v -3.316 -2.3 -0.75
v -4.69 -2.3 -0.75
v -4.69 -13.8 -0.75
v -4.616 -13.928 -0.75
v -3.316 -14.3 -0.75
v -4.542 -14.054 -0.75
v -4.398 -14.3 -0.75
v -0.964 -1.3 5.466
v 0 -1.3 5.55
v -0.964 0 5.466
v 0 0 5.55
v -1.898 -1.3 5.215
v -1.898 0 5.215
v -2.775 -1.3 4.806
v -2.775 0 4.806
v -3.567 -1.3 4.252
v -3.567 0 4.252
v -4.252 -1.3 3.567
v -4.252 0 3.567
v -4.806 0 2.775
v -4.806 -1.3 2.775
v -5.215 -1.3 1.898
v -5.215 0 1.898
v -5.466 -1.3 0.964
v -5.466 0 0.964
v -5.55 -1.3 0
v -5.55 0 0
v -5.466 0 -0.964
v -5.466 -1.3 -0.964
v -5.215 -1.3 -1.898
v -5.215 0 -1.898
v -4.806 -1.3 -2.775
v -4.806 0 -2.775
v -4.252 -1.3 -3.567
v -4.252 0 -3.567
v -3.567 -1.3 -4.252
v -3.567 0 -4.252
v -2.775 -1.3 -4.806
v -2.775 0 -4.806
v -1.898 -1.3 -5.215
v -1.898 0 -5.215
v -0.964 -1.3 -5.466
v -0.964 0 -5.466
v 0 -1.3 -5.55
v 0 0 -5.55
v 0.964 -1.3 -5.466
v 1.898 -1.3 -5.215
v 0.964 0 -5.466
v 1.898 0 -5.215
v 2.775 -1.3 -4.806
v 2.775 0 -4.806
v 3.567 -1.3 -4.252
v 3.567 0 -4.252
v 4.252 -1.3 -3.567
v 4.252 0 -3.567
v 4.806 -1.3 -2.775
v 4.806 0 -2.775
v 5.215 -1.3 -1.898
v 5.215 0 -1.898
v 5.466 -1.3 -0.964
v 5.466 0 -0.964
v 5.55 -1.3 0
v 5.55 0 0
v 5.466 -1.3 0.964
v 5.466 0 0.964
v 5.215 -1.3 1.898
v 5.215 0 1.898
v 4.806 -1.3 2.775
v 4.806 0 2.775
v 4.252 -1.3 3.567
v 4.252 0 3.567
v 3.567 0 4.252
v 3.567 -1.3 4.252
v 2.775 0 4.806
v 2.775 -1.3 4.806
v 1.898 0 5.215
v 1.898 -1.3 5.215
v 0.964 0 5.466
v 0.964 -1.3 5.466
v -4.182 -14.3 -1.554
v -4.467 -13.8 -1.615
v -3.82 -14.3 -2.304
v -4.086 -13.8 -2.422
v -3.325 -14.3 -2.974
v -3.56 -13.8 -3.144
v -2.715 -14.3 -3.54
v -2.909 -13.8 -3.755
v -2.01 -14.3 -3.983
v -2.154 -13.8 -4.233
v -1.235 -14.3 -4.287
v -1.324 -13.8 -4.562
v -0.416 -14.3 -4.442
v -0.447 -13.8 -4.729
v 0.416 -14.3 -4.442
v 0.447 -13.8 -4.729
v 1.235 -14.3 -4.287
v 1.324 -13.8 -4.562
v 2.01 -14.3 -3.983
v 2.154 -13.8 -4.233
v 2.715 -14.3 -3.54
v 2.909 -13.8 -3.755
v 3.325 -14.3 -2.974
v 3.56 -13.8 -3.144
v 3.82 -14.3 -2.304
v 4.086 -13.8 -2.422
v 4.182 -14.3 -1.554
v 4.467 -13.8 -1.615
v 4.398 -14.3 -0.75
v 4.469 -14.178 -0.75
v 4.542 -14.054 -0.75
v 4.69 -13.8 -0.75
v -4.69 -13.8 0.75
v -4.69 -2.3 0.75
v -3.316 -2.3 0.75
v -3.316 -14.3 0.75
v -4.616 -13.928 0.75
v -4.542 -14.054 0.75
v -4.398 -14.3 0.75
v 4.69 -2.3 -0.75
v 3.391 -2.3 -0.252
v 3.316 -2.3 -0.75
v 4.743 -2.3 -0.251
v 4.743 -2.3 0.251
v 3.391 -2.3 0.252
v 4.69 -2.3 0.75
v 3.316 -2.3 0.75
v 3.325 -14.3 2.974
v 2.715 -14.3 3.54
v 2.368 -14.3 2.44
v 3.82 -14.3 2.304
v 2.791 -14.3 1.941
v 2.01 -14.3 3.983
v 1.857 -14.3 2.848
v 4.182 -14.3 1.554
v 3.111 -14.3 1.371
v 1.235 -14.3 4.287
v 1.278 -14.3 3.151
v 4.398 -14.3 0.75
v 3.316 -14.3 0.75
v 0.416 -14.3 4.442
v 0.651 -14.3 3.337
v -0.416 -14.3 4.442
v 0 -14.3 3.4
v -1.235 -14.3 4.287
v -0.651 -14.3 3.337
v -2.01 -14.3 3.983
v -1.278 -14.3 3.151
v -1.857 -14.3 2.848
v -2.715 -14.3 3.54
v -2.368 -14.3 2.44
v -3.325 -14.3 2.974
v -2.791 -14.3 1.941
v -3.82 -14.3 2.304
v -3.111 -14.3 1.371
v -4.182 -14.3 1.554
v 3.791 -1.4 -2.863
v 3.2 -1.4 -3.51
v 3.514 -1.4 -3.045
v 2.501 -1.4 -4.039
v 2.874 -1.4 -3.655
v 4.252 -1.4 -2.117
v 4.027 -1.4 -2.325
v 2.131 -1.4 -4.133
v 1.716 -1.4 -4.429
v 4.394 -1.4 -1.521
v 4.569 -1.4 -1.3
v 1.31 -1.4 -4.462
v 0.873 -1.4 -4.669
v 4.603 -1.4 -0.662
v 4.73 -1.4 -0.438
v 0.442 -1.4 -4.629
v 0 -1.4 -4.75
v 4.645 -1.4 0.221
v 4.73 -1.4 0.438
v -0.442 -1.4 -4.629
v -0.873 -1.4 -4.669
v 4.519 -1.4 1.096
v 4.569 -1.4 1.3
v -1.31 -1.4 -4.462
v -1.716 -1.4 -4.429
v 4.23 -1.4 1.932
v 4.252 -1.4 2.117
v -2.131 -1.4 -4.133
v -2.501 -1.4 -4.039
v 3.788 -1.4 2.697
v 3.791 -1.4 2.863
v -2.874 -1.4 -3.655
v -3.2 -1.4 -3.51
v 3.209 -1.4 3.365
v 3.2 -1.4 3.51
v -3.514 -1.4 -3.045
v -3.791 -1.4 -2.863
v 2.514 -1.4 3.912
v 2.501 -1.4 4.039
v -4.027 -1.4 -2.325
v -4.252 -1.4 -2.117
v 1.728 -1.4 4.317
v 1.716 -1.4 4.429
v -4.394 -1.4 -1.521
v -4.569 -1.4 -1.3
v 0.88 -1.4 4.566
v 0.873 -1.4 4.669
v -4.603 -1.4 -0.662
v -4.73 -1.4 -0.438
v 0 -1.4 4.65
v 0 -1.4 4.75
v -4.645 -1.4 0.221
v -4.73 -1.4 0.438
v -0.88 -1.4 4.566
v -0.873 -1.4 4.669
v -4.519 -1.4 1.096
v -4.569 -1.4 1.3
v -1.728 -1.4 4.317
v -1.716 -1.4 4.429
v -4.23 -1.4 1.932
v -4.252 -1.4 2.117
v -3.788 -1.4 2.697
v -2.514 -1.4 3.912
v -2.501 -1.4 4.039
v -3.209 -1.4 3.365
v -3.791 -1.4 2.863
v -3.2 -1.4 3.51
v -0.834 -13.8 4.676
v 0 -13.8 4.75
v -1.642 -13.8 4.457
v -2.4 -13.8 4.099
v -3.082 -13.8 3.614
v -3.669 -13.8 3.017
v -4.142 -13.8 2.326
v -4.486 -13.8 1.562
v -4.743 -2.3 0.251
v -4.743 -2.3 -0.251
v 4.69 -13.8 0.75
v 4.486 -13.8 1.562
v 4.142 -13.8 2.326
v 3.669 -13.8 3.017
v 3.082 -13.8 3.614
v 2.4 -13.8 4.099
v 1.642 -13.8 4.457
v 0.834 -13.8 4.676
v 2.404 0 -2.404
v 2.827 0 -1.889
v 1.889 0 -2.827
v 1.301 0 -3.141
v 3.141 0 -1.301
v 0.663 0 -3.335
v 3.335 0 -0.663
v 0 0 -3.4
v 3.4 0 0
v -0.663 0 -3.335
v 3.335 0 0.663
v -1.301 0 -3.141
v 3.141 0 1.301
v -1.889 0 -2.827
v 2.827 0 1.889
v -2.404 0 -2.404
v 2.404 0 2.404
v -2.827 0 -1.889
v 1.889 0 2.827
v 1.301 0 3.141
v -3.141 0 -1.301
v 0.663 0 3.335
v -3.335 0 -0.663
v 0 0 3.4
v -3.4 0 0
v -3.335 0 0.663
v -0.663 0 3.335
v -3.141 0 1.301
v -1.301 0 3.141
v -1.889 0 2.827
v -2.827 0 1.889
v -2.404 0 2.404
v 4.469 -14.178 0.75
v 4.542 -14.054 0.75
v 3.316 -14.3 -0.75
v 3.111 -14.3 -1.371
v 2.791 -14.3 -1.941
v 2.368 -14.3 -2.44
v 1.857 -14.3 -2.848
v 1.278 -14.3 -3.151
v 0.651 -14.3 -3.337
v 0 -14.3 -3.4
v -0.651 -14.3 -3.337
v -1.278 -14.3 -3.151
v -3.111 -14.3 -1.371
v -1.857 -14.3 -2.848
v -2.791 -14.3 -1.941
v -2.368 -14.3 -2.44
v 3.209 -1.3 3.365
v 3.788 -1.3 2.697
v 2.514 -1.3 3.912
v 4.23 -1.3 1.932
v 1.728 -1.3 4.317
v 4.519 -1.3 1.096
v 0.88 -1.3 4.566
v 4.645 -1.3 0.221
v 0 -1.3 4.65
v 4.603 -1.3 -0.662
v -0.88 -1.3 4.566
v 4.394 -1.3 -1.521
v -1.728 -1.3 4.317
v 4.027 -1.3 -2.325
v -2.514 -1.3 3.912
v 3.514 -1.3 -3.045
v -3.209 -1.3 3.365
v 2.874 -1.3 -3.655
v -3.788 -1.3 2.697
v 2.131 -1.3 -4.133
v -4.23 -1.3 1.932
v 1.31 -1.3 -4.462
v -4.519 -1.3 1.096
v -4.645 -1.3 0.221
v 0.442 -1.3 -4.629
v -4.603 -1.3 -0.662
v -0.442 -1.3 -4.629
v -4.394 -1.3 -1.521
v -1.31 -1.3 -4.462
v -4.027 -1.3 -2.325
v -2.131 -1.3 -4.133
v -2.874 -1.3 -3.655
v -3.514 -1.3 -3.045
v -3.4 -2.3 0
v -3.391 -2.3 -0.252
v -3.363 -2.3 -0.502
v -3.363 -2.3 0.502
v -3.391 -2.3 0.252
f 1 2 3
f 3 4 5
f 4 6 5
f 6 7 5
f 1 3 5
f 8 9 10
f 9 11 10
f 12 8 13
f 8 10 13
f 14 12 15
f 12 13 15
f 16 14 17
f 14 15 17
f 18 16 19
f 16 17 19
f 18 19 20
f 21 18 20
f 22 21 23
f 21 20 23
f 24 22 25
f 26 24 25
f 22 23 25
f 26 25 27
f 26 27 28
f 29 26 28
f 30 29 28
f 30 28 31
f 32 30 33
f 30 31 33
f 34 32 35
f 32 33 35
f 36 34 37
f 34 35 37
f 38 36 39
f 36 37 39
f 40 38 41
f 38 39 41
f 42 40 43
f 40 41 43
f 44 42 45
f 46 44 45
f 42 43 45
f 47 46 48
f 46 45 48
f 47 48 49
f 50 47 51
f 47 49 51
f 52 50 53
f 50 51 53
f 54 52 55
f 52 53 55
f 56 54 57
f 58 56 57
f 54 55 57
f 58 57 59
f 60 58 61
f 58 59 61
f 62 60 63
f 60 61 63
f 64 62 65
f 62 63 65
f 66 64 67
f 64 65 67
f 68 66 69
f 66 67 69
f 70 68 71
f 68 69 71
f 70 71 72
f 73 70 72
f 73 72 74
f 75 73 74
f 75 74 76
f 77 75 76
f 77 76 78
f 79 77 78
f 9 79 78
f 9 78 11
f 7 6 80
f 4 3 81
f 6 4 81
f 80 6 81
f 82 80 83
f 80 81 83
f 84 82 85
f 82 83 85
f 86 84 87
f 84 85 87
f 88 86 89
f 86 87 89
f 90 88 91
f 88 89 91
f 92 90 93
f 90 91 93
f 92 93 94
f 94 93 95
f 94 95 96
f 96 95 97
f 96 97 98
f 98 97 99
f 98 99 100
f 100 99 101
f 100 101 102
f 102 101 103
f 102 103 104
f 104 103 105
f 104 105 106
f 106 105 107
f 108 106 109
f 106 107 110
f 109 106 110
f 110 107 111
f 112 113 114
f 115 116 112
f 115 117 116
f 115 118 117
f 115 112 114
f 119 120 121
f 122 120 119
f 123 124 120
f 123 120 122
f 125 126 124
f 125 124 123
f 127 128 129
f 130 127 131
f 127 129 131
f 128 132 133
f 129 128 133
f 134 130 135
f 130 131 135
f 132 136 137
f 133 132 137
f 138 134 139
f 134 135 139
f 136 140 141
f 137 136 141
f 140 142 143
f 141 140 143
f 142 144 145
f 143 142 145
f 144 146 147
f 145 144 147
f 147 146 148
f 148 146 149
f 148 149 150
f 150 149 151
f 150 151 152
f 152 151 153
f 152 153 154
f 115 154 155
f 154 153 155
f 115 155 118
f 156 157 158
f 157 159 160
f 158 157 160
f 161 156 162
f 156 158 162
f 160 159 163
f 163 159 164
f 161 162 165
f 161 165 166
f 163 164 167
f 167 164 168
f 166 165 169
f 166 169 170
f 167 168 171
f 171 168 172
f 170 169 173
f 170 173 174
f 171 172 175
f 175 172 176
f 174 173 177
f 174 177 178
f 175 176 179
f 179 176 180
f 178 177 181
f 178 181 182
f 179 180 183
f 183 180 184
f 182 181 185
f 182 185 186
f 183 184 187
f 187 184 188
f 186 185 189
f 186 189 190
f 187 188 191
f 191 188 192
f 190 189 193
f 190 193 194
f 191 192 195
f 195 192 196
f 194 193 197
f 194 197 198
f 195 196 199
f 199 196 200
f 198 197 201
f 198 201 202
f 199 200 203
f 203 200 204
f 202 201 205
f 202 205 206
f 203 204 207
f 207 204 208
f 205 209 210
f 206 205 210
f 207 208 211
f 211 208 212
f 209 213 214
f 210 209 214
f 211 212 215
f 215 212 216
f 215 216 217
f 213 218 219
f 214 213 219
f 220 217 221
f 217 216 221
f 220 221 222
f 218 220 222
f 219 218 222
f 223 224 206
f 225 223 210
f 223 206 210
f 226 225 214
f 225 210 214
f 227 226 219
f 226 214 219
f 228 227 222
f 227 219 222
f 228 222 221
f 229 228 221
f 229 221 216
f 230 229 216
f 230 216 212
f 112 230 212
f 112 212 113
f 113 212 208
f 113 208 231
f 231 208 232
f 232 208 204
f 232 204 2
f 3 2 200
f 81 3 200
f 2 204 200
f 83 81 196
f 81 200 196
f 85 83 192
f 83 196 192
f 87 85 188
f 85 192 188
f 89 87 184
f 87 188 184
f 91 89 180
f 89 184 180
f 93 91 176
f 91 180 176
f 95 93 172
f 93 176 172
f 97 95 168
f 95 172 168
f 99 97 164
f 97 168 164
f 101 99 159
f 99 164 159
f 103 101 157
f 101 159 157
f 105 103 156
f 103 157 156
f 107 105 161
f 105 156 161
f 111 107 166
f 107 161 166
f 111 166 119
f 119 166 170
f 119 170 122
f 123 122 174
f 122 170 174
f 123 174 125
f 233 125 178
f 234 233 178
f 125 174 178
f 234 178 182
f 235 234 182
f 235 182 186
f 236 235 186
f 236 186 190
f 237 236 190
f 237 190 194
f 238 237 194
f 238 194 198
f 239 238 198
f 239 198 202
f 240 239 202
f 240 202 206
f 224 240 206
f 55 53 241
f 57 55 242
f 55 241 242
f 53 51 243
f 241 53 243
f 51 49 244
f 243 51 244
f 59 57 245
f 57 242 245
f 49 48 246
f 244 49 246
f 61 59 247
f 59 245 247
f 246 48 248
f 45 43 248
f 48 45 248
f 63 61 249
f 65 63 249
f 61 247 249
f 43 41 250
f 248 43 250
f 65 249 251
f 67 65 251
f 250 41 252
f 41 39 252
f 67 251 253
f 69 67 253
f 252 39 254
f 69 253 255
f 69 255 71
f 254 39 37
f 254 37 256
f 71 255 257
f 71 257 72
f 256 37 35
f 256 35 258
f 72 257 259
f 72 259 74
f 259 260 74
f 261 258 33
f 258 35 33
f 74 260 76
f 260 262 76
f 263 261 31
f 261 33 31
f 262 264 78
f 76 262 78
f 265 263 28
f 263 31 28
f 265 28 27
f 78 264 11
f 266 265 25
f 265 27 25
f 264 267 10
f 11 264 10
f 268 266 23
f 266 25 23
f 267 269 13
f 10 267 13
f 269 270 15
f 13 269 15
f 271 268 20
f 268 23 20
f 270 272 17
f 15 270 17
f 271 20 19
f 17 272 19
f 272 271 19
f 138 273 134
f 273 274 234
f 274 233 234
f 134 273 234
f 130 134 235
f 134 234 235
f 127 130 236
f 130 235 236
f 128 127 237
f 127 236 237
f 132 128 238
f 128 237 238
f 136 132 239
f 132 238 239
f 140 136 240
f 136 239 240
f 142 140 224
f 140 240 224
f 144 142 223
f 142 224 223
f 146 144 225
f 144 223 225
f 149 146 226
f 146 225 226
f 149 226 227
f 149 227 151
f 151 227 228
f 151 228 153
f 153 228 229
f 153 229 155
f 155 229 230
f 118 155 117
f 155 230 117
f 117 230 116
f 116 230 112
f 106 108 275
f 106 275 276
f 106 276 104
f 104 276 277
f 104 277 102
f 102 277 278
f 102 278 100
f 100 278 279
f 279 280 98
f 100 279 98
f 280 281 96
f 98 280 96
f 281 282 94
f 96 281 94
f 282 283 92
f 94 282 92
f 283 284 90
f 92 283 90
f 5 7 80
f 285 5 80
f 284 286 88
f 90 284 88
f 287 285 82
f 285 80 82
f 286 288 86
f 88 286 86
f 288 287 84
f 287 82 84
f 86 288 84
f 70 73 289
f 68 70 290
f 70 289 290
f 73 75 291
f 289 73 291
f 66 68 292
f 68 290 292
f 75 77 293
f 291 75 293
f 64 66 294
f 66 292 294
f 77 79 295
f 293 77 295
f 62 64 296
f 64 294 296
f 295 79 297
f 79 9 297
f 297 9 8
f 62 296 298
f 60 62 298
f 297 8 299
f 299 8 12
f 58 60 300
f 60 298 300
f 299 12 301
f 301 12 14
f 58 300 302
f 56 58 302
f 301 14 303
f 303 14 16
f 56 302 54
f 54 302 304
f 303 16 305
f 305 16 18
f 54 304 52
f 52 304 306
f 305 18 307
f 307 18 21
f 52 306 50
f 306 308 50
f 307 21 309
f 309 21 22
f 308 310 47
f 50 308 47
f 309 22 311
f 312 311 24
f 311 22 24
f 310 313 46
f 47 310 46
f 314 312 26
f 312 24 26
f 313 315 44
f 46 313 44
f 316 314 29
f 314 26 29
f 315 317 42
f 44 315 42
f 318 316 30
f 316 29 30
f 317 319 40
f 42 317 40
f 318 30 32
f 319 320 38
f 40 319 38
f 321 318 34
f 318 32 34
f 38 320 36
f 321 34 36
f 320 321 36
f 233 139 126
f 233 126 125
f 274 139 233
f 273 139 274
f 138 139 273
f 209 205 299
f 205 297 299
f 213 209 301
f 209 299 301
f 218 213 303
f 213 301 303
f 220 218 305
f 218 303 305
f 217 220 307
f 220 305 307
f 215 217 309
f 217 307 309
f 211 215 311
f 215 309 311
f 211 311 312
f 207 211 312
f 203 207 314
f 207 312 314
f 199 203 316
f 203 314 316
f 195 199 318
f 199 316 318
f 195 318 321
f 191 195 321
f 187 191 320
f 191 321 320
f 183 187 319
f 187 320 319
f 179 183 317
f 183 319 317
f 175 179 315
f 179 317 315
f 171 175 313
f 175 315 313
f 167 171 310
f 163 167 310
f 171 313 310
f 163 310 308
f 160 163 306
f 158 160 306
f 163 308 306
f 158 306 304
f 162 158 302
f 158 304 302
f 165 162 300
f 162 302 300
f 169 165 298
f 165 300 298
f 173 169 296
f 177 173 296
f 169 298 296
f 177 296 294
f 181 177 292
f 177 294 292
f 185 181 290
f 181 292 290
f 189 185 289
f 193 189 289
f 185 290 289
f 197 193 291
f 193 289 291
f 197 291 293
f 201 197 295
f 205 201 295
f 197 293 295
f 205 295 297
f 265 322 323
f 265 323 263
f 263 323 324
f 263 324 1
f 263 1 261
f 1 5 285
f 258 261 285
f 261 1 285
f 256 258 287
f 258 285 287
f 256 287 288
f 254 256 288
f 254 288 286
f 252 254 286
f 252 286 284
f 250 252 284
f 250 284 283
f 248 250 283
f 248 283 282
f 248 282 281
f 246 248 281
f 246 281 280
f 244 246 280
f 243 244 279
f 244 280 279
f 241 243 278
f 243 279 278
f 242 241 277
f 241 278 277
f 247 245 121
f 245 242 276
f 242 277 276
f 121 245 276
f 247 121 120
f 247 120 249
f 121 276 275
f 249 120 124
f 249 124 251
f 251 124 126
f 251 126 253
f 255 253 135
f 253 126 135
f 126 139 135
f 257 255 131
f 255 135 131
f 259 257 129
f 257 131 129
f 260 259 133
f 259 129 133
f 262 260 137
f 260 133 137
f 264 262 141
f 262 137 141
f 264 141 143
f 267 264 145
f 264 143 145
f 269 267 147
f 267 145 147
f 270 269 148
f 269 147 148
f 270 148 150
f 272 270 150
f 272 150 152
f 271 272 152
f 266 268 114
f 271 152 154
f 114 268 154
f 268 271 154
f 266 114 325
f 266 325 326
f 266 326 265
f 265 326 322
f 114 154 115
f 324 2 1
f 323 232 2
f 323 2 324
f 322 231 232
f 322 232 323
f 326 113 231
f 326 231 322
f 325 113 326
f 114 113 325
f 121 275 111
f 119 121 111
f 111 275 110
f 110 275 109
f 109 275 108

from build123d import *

# Parameters (mm, degrees)
TAPPED_HOLE1_D     = 6.8
SKETCH4_W          = 9.5
SKETCH4_H          = 1.5
CUT_EXTRUDE1_DEPTH = 12


with BuildPart() as part:
    # Sketch1 → Revolve1 (revolve)
    with BuildSketch(Plane(origin=(0, 0, 0), x_dir=(0, 0, -1), z_dir=(1, 0, 0))):
        Polygon((-4.75, -13.8), (-4.75, -1.4), (-4.65, -1.4), (-4.65, -1.3), (-5.55, -1.3), (-5.55, 0), (-3.25, 0), (-3.25, -14.3), (-4.461324865, -14.3), align=None)
    revolve(axis=Axis((0, 0, 0), (0, -1, 0)))

    # Tapped Hole1 (through all)
    with Locations(Plane(origin=(0, 0, 0), x_dir=(1, 0, 0), z_dir=(0, 1, 0))):
        with Locations((0, 0)):
            Hole(TAPPED_HOLE1_D / 2)

    # Sketch4 → Cut-Extrude1 (cut)
    with BuildSketch(Plane.XZ.offset(14.3)):
        Rectangle(SKETCH4_W, SKETCH4_H)
    extrude(amount=-CUT_EXTRUDE1_DEPTH, mode=Mode.SUBTRACT)


solid = part.part
